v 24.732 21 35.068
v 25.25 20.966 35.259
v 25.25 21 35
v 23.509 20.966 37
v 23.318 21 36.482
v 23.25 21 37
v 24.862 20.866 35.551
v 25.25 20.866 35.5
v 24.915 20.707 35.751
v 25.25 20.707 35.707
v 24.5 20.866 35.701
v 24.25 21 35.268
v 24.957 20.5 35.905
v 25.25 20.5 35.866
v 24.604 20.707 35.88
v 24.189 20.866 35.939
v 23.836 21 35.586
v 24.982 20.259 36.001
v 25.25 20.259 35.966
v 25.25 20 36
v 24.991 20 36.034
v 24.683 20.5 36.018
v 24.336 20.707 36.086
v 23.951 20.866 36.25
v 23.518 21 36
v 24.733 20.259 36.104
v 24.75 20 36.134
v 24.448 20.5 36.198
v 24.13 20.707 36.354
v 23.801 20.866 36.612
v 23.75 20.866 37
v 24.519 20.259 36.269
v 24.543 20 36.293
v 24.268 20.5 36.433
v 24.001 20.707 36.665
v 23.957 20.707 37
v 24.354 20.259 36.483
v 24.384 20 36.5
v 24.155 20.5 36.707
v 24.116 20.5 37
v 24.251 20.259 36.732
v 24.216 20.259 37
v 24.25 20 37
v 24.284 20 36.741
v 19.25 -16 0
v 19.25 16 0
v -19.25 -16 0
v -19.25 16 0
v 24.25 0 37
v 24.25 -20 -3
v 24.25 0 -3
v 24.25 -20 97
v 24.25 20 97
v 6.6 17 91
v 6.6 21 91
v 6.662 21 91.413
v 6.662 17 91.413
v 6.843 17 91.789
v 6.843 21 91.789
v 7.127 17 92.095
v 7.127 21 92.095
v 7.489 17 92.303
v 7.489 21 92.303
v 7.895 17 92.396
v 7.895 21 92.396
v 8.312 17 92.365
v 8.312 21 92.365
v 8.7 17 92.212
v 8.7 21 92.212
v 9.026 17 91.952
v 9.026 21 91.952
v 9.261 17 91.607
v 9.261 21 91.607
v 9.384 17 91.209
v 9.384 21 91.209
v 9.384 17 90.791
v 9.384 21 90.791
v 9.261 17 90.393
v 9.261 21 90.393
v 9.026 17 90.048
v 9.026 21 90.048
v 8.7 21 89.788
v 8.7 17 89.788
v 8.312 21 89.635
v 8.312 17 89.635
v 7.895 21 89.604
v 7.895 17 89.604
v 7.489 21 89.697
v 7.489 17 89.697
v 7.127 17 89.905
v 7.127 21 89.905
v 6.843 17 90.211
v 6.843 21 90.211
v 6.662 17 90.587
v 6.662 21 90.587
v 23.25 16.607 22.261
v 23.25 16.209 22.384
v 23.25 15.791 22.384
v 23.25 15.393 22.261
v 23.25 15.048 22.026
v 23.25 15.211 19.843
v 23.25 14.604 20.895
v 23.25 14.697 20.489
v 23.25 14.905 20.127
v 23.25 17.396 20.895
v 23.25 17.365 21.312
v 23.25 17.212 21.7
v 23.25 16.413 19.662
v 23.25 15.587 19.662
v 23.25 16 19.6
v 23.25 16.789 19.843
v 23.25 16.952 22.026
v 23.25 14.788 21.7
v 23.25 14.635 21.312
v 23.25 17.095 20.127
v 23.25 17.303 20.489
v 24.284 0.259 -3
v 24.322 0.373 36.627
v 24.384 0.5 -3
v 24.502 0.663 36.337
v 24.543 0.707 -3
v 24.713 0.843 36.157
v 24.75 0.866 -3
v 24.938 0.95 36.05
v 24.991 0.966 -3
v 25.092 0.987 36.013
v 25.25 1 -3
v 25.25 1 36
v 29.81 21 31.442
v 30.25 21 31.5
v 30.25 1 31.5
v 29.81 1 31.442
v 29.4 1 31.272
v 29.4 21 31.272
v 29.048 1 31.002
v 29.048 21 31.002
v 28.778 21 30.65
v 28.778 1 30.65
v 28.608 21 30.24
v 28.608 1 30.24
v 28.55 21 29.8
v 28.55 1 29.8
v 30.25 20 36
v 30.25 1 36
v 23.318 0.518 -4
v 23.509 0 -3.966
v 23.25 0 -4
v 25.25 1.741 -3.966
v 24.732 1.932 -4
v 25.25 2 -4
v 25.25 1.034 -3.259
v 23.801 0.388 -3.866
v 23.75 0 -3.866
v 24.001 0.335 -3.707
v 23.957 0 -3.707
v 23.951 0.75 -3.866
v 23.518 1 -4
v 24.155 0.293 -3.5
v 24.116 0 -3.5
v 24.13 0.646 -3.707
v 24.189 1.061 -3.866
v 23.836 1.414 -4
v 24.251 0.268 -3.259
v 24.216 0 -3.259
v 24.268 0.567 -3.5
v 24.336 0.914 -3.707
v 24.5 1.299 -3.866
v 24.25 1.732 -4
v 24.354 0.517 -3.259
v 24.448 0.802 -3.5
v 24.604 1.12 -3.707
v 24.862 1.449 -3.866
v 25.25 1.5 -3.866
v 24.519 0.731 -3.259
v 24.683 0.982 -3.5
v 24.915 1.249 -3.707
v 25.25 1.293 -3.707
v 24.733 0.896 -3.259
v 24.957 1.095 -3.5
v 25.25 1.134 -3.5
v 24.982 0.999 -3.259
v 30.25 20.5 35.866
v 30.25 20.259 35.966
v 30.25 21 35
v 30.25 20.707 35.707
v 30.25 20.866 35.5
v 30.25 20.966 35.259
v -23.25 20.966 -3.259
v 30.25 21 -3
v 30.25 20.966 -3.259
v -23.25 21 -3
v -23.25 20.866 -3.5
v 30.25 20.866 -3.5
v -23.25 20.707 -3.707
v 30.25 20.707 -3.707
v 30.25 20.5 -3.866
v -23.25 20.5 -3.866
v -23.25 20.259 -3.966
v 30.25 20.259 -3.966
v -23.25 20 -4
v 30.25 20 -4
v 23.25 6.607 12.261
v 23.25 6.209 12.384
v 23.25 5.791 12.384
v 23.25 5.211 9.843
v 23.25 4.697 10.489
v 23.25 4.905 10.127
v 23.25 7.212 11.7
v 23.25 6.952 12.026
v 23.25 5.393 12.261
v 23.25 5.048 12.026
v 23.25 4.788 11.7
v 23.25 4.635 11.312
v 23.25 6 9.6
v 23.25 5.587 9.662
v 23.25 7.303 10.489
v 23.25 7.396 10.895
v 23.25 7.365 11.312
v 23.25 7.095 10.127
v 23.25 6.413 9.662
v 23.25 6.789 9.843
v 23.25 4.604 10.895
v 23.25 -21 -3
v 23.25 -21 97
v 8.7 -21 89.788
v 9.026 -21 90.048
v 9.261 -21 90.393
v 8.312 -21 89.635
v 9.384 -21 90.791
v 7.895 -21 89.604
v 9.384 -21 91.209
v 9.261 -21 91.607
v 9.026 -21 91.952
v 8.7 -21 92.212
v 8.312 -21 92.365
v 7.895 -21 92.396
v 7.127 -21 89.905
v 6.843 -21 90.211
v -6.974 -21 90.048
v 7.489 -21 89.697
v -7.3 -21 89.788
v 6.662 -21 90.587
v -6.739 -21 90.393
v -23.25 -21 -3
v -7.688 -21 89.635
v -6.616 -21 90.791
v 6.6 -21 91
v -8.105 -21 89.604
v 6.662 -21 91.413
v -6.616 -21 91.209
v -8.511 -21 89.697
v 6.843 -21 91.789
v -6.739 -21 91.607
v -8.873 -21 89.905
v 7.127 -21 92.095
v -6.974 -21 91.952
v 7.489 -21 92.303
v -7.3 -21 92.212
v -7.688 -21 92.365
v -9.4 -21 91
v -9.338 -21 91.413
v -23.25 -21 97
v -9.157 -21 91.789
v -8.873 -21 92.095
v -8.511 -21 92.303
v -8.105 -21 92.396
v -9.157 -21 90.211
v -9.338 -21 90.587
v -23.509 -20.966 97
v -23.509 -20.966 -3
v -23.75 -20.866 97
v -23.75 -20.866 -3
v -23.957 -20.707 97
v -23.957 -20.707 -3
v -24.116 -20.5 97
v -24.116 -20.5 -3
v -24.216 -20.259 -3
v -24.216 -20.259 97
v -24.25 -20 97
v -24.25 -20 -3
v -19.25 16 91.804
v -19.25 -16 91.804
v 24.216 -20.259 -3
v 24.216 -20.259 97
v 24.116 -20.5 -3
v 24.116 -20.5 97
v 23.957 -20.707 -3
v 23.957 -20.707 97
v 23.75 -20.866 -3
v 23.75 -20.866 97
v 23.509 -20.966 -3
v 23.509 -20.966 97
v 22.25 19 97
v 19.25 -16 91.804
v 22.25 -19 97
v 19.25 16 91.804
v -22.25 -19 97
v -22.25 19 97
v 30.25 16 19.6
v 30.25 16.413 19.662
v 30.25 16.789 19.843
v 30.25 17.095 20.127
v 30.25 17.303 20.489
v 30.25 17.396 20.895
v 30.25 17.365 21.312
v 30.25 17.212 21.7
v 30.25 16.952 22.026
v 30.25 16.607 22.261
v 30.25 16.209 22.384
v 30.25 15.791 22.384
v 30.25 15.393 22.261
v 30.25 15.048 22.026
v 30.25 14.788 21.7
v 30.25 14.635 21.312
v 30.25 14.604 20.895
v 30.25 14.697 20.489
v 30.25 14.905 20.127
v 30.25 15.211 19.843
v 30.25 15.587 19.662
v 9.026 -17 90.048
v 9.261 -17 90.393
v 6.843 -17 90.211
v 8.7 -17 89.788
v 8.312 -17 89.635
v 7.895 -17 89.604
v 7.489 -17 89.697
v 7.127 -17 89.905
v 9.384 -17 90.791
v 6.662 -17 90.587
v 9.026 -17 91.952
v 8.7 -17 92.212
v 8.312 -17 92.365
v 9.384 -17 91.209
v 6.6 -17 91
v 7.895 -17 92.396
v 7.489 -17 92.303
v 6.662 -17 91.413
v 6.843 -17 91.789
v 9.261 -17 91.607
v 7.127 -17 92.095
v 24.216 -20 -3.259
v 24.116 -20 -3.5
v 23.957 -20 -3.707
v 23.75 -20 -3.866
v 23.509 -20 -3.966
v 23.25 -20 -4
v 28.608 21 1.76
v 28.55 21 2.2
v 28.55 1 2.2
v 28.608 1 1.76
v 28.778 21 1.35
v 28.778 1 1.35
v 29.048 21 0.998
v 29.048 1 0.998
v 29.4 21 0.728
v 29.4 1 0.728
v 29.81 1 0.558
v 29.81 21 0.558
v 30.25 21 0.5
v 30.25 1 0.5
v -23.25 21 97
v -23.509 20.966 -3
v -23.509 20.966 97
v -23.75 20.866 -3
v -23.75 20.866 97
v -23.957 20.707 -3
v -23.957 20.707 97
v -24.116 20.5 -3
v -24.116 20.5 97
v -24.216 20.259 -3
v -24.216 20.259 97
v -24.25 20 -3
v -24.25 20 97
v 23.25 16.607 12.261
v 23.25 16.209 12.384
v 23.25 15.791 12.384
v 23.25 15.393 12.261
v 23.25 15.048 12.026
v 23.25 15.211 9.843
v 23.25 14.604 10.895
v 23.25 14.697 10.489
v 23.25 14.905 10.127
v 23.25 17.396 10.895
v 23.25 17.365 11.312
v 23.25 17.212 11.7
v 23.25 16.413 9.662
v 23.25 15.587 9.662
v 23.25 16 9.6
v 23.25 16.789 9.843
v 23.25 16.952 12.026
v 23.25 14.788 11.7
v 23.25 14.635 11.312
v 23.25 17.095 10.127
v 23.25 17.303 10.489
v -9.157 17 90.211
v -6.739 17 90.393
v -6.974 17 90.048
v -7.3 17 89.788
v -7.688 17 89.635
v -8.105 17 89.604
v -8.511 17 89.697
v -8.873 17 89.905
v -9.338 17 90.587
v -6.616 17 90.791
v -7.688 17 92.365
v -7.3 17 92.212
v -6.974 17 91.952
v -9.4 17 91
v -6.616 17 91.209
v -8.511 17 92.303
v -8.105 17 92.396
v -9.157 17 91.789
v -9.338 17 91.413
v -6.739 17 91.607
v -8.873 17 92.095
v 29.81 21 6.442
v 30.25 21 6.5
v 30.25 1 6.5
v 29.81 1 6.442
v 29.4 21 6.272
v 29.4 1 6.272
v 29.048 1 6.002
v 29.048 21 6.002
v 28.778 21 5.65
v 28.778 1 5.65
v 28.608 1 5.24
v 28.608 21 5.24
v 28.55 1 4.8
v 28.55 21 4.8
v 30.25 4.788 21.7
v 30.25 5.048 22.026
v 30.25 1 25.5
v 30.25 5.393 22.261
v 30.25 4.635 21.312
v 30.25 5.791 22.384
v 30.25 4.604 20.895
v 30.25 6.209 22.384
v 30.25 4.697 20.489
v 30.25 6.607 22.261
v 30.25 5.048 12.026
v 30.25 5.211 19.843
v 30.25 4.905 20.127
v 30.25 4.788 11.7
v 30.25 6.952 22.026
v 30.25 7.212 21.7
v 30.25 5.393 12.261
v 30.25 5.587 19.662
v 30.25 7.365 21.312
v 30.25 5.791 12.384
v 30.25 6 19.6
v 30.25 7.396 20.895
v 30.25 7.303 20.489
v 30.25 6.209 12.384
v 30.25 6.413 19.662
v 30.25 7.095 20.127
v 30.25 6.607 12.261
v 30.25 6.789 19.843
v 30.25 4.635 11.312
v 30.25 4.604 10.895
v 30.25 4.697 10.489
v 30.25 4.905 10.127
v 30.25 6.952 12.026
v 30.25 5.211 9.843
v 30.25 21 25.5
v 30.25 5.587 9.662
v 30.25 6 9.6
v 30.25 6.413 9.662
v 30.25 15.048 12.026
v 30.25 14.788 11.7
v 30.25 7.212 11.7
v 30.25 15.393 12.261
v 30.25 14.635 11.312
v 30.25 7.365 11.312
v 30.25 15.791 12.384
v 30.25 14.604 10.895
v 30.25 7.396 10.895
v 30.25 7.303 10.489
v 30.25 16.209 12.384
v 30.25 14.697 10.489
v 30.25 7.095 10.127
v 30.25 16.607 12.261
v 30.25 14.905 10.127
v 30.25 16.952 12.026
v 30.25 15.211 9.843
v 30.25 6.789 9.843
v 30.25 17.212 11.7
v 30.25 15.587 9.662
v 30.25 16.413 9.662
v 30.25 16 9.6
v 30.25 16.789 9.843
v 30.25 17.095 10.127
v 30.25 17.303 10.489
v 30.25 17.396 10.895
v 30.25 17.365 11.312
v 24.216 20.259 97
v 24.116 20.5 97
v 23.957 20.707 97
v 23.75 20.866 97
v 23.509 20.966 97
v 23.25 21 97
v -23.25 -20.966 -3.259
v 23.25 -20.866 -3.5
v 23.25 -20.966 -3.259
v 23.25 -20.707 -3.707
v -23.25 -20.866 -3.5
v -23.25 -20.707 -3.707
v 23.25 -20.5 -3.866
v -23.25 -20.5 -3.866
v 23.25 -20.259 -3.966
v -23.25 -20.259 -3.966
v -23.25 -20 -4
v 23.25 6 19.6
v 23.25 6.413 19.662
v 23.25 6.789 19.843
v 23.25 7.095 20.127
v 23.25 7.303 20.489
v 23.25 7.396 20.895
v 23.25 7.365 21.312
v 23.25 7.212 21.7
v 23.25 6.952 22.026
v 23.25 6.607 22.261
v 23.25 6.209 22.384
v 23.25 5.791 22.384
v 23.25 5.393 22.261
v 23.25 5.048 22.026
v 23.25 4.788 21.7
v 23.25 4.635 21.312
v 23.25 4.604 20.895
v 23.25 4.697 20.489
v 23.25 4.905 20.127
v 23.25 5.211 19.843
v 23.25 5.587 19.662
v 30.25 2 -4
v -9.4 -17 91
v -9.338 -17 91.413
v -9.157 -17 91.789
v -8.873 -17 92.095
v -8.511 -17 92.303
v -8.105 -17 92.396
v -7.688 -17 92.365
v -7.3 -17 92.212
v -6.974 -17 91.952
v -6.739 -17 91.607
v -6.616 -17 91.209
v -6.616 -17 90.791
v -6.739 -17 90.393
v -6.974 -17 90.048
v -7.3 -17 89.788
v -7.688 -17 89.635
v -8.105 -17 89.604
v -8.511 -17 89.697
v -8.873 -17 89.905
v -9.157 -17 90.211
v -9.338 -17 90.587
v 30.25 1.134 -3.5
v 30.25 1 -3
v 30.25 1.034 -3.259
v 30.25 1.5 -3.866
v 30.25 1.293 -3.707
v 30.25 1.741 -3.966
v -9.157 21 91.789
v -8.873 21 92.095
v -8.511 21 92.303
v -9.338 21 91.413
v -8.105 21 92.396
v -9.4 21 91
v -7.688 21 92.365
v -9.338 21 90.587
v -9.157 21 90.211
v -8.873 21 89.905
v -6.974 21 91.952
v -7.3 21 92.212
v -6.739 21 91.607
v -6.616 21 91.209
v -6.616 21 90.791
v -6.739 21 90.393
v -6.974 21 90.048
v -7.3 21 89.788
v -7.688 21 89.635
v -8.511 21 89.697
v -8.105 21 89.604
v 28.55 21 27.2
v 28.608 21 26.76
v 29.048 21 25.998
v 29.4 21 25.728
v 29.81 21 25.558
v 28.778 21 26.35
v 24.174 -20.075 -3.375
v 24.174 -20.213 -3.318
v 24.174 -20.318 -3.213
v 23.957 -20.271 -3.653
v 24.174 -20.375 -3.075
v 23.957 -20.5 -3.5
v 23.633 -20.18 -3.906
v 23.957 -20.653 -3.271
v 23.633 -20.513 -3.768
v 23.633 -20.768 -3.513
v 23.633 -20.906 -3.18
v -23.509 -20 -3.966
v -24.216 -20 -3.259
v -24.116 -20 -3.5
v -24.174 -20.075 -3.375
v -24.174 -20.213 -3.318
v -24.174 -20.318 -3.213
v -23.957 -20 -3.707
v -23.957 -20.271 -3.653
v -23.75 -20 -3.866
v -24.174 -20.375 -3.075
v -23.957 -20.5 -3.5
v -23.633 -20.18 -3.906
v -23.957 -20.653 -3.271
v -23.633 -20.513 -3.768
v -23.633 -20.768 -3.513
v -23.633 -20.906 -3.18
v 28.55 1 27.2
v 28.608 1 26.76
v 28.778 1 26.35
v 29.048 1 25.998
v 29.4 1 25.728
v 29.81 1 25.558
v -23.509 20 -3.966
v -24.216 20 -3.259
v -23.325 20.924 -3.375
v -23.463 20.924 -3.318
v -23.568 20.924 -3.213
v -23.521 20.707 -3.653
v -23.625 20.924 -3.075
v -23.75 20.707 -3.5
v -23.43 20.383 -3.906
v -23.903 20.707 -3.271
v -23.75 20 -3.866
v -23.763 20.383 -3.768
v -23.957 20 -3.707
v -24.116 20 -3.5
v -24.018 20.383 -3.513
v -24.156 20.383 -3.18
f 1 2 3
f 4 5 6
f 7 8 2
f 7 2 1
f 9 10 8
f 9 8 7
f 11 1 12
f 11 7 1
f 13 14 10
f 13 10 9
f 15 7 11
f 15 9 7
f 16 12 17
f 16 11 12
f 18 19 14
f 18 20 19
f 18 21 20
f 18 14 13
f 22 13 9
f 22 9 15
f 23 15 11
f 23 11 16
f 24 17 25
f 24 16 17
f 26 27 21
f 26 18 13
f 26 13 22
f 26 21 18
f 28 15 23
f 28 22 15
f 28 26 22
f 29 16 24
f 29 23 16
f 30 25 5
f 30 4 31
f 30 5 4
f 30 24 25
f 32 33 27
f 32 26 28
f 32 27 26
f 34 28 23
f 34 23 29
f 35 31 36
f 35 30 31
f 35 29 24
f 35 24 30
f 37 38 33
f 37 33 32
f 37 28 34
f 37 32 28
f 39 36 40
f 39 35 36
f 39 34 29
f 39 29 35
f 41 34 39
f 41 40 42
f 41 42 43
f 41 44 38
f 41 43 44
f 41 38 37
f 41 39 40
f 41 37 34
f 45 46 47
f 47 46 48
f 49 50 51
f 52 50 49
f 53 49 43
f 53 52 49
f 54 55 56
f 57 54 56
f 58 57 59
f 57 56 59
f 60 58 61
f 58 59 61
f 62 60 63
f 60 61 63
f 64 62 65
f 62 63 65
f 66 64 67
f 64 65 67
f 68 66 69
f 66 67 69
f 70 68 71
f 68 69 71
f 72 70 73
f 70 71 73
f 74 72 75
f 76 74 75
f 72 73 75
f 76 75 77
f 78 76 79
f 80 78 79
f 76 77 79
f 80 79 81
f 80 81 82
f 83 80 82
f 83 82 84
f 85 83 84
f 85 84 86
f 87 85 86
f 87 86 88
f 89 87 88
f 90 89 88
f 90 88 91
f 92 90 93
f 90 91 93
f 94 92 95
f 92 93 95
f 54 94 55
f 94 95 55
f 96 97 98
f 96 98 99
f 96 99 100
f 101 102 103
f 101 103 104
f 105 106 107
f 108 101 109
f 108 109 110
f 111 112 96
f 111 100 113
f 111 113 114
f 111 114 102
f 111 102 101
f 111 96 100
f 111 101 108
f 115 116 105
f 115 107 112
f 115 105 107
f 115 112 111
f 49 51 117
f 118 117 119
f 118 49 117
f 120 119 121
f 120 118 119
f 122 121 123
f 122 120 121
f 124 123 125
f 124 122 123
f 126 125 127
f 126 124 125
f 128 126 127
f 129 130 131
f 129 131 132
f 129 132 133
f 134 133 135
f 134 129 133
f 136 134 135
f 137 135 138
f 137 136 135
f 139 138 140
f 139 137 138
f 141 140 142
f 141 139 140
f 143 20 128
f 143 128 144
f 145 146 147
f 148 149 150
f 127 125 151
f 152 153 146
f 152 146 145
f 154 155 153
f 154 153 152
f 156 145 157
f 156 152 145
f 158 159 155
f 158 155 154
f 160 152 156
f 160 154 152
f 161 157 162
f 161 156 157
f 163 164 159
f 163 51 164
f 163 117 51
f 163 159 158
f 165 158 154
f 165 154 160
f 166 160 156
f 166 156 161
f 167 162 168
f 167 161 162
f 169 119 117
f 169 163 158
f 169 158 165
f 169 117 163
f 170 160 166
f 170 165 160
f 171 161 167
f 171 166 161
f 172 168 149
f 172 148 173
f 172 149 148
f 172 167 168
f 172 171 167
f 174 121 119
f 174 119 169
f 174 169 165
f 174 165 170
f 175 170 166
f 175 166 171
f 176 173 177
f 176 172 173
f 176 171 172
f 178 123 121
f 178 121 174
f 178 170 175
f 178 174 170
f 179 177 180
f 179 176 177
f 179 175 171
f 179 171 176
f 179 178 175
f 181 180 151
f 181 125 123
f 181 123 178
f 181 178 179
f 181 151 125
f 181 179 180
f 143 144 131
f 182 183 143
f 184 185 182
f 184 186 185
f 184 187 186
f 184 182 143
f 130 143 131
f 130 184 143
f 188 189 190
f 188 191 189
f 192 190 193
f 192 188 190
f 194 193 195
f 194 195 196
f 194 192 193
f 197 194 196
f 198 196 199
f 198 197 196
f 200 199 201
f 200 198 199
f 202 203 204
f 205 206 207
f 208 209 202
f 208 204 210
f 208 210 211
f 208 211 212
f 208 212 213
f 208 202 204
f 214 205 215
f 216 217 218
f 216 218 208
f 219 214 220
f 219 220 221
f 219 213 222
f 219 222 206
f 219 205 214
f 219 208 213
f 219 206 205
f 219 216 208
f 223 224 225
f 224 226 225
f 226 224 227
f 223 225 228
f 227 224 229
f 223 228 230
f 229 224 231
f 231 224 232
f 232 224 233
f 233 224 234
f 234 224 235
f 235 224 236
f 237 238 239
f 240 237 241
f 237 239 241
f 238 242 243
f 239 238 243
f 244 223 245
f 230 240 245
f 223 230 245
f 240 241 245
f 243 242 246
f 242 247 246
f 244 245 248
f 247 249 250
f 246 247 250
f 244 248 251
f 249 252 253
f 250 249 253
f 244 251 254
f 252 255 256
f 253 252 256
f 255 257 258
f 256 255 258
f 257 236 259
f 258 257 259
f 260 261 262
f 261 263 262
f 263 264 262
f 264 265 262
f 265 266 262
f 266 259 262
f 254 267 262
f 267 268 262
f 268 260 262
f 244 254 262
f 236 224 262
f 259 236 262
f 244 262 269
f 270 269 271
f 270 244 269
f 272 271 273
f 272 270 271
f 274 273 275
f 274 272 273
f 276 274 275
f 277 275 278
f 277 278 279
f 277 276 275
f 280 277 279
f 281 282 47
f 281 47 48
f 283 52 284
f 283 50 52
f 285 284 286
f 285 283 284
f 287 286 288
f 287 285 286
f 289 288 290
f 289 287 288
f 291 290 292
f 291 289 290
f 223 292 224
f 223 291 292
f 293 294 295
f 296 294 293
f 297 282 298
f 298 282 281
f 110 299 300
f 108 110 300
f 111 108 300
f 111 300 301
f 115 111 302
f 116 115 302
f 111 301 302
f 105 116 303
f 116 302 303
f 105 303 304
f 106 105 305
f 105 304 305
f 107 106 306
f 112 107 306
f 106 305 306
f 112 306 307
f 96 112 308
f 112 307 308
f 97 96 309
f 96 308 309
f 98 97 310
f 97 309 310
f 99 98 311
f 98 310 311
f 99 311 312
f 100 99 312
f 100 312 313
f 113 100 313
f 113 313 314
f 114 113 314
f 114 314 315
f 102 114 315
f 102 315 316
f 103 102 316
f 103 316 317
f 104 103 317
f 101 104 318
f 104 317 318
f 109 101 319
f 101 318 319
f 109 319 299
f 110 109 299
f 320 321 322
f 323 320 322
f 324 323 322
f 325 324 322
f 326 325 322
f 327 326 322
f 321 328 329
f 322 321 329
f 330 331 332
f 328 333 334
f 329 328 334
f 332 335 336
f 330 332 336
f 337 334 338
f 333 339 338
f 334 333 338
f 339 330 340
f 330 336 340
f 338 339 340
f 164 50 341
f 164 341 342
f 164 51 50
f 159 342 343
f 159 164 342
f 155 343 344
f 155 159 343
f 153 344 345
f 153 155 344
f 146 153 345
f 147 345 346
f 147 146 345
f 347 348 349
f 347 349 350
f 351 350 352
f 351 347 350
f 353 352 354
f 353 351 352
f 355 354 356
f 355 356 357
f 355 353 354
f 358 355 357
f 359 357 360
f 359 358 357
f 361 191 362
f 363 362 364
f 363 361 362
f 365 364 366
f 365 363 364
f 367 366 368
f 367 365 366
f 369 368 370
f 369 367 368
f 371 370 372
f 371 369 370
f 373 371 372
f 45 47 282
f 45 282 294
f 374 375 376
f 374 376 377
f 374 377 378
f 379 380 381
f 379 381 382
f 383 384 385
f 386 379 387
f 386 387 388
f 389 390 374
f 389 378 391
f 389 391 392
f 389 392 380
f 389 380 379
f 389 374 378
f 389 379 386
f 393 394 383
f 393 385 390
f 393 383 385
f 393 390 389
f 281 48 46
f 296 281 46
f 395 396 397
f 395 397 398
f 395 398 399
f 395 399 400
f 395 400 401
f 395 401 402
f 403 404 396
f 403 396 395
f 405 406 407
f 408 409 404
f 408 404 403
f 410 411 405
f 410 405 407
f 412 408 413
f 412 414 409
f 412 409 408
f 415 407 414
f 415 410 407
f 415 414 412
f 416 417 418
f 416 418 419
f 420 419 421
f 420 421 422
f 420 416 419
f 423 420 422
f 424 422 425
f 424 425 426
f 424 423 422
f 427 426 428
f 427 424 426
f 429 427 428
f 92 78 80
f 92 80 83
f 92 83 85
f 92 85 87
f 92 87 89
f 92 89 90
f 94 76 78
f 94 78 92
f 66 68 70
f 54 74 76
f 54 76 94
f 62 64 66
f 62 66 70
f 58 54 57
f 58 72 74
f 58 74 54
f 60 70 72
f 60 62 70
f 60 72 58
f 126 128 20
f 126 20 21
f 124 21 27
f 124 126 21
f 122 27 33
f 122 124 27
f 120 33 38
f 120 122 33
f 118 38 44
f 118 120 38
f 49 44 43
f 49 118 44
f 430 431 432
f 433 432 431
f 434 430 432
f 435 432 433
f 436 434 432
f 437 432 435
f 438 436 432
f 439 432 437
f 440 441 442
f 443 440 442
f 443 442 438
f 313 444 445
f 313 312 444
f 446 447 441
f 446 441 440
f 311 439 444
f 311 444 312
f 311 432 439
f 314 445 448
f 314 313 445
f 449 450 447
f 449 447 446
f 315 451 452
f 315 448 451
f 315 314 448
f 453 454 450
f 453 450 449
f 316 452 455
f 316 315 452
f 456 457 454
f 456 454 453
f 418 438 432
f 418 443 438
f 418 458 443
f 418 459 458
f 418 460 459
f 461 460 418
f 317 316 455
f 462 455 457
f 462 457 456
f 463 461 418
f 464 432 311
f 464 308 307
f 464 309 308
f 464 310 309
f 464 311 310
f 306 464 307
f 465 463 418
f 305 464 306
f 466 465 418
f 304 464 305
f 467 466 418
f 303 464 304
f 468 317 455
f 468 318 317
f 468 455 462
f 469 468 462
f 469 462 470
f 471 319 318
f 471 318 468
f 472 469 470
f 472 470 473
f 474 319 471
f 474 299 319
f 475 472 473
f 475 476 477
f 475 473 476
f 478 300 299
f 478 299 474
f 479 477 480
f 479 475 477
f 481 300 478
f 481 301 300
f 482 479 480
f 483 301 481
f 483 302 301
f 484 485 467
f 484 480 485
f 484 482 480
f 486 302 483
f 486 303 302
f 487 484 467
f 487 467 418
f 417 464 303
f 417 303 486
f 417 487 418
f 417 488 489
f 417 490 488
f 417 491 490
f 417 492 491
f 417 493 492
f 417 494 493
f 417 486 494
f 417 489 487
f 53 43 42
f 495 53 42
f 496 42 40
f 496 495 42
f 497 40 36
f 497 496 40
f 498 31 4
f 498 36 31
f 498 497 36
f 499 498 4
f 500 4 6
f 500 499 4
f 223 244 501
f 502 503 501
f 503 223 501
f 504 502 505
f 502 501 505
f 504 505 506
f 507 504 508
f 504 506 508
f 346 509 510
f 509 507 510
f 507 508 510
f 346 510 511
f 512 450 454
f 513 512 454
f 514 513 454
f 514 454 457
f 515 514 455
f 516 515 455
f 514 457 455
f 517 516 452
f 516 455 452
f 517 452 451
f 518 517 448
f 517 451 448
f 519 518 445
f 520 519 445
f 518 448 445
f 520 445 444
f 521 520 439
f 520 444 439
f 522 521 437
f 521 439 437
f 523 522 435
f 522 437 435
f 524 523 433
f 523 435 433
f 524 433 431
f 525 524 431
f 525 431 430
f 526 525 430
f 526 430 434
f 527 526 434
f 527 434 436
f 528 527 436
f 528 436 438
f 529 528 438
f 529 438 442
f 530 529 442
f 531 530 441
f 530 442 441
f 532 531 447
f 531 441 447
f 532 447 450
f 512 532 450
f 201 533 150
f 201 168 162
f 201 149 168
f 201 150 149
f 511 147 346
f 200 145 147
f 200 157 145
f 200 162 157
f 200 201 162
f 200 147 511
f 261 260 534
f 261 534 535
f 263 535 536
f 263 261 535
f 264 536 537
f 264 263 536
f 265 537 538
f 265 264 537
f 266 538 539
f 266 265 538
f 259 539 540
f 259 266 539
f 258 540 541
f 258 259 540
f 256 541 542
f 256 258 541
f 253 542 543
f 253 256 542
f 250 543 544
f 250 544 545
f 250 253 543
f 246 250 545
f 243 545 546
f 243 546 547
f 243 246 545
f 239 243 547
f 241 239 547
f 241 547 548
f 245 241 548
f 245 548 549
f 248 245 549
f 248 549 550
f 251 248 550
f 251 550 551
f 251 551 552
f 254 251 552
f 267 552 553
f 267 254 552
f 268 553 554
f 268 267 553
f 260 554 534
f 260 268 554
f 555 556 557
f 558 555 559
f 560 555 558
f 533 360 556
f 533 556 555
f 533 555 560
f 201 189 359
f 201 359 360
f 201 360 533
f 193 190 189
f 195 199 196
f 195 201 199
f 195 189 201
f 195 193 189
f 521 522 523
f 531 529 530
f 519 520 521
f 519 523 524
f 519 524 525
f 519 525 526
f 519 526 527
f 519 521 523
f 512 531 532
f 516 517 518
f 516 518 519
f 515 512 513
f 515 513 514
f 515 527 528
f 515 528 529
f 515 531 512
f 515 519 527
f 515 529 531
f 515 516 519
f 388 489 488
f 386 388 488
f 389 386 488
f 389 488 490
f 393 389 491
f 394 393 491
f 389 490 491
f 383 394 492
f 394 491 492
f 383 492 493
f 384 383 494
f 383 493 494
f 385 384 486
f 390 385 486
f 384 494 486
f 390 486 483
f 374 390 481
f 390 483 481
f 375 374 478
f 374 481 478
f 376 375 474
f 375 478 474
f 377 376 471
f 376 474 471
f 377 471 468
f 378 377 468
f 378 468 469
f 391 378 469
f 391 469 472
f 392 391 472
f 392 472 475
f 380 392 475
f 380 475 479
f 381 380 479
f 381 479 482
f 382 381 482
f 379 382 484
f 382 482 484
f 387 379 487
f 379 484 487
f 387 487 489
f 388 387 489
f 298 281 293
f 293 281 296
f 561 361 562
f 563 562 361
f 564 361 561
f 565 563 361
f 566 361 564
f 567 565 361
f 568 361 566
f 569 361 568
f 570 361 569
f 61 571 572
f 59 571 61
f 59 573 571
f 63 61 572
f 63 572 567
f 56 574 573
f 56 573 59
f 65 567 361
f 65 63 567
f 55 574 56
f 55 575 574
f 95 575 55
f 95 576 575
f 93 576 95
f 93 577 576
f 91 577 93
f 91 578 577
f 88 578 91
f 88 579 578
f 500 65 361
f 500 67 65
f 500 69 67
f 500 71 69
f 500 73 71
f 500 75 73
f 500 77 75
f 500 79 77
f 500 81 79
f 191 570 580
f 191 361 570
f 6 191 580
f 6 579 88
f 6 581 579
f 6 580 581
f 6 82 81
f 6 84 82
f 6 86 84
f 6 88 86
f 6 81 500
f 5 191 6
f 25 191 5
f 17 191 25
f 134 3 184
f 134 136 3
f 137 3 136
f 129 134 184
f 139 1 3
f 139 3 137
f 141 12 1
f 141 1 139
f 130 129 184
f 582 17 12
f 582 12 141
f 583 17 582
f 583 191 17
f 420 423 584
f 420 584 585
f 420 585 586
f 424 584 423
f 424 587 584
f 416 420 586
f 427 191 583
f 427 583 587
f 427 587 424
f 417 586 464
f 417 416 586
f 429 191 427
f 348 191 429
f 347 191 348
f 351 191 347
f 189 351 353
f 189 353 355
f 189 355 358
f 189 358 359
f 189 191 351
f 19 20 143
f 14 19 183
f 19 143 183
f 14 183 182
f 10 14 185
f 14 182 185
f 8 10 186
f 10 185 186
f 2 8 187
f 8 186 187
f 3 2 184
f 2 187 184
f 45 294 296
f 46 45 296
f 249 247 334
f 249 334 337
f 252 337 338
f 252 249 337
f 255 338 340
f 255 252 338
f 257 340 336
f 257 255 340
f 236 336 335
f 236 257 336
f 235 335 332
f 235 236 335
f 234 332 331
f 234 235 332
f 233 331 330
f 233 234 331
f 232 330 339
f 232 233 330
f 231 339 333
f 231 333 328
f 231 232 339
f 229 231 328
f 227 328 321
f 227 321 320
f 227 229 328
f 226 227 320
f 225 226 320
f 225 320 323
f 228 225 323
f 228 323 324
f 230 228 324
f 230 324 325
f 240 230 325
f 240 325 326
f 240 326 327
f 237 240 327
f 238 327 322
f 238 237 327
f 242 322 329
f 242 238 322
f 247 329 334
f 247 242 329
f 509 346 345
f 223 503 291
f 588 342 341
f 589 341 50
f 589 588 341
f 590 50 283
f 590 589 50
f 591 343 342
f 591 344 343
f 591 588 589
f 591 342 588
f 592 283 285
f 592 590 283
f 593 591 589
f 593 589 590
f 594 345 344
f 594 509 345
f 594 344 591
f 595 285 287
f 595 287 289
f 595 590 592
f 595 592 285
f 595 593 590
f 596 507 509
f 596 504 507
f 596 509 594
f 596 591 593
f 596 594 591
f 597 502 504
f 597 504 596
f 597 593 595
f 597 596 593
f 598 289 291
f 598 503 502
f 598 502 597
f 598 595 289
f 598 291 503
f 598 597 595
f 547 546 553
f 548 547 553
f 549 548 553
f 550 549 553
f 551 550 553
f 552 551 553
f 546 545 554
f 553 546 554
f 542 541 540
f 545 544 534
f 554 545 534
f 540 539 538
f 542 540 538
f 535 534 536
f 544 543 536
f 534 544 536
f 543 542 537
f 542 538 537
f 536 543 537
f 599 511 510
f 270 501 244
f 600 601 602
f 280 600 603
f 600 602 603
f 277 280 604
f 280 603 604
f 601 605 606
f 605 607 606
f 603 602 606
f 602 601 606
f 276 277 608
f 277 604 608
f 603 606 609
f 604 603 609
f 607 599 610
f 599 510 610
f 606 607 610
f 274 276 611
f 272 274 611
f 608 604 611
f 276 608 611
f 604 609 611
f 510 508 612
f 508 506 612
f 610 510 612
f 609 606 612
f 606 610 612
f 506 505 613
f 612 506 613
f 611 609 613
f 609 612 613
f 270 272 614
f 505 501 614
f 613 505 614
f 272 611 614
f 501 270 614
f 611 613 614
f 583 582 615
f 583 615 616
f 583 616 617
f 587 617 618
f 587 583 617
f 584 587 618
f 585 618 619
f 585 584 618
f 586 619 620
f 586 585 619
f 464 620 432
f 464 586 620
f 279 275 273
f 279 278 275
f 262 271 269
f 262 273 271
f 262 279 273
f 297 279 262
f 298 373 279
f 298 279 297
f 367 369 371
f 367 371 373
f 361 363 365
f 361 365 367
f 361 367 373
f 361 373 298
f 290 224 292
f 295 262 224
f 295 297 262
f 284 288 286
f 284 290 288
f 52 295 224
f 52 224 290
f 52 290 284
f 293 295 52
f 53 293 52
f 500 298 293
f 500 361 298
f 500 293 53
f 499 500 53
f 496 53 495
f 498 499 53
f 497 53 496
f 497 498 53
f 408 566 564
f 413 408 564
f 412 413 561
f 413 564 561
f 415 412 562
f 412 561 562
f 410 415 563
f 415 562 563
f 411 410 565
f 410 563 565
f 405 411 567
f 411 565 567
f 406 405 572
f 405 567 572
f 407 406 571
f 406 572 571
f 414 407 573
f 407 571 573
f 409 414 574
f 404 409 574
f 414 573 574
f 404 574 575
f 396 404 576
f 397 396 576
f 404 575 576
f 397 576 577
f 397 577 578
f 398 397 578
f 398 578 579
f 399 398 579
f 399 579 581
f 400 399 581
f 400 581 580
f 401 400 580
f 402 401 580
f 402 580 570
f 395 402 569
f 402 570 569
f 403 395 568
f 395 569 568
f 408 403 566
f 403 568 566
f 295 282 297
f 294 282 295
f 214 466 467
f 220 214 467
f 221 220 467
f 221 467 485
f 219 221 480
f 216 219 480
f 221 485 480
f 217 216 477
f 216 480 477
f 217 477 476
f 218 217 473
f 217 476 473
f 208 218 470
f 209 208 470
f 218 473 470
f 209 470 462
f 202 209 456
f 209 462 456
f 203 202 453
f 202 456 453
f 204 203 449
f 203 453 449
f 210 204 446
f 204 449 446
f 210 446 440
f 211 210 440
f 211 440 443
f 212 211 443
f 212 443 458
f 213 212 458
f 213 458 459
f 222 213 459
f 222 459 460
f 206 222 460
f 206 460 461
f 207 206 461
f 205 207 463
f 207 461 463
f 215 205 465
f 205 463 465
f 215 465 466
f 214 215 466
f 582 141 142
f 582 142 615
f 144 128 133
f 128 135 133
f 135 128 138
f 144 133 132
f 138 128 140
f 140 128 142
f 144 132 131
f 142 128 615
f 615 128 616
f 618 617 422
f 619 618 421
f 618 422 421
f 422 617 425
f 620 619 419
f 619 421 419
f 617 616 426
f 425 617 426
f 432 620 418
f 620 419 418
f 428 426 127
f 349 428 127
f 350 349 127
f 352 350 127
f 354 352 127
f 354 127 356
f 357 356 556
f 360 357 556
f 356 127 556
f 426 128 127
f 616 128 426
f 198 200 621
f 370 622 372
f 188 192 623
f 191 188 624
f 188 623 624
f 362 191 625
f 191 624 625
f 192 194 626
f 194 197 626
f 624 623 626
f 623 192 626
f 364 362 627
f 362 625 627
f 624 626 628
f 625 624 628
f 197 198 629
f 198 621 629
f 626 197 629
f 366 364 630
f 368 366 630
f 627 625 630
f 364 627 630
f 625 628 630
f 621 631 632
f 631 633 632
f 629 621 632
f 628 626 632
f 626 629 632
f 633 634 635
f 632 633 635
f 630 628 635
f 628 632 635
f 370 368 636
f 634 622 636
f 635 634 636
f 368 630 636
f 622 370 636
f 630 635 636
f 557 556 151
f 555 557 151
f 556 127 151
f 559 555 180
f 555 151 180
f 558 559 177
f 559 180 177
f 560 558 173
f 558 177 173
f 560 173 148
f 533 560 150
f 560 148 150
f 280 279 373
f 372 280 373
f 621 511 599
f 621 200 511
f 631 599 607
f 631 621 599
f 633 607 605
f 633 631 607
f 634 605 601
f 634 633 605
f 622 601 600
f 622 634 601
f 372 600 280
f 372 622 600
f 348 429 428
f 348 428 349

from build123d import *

# Parameters (mm, degrees)
SKETCH2_W                         = 48.5
SKETCH2_H                         = 42
SKETCH2_W_2                       = 38.5
SKETCH2_H_2                       = 32
SLEEVE_DEPTH                      = 97
SKETCH3_W                         = 48.5
SKETCH3_H                         = 42
REAR_COVER_DEPTH                  = 4
BASKET_CLAMP_DEPTH                = 20
SKETCH5_R                         = 1.4
BASKET_CLAMP_MOUNTING_HOLES_DEPTH = 7
SKETCH7_R                         = 1.4
FRONT_COVER_SCREW_HOLES_TOP_DEPTH = 4
F_1MM_EDGE_FILLETS_R              = 1
BATTERY_INSERTION_CHAMFER_SIZE    = 3
BATTERY_INSERTION_CHAMFER_SIZE2   = 5.196152423


with BuildPart() as part:
    # Sketch2 → Sleeve (new body)
    with BuildSketch(Plane.XY):
        Rectangle(SKETCH2_W, SKETCH2_H)
        Rectangle(SKETCH2_W_2, SKETCH2_H_2, mode=Mode.SUBTRACT)
    extrude(amount=SLEEVE_DEPTH)

    # Sketch3 → Rear Cover (add)
    with BuildSketch(Plane(origin=(0, 0, 0), x_dir=(-1, 0, 0), z_dir=(0, 0, -1))):
        Rectangle(SKETCH3_W, SKETCH3_H)
    extrude(amount=REAR_COVER_DEPTH)

    # Sketch4 → Basket Clamp (add)
    with BuildSketch(Plane(origin=(0, 21, 0), x_dir=(1, 0, 0), z_dir=(0, 1, 0))):
        with BuildLine():
            Line((24.25, 4), (24.25, -36))
            Line((24.25, -36), (30.25, -36))
            Line((30.25, -36), (30.25, -31.5))
            ThreePointArc((30.25, -31.5), (29.047918472, -31.002081528), (28.55, -29.8))
            Line((28.55, -29.8), (28.55, -27.2))
            ThreePointArc((28.55, -27.2), (29.047918472, -25.997918472), (30.25, -25.5))
            Line((30.25, -25.5), (30.25, -6.5))
            ThreePointArc((30.25, -6.5), (29.047918472, -6.002081528), (28.55, -4.8))
            Line((28.55, -4.8), (28.55, -2.2))
            ThreePointArc((28.55, -2.2), (29.047918472, -0.997918472), (30.25, -0.5))
            Line((30.25, -0.5), (30.25, 4))
            Line((30.25, 4), (24.25, 4))
        make_face()
    extrude(amount=-BASKET_CLAMP_DEPTH)

    # Sketch5 → Basket Clamp Mounting Holes (cut)
    with BuildSketch(Plane(origin=(30.25, 0, 0), x_dir=(0, 0, -1), z_dir=(1, 0, 0))):
        with Locations((-21, 16)):
            Circle(SKETCH5_R)
        with Locations((-11, 16)):
            Circle(SKETCH5_R)
        with Locations((-11, 6)):
            Circle(SKETCH5_R)
        with Locations((-21, 6)):
            Circle(SKETCH5_R)
    extrude(amount=-BASKET_CLAMP_MOUNTING_HOLES_DEPTH, mode=Mode.SUBTRACT)

    # Sketch7 → Front Cover Screw Holes Top (cut)
    with BuildSketch(Plane(origin=(0, 21, 0), x_dir=(1, 0, 0), z_dir=(0, 1, 0))):
        with Locations((-8, -91)):
            Circle(SKETCH7_R)
        with Locations((8, -91)):
            Circle(SKETCH7_R)
    front_cover_screw_holes_top = extrude(amount=-FRONT_COVER_SCREW_HOLES_TOP_DEPTH, mode=Mode.SUBTRACT)

    # Front Cover Screw Holes Bottom: Front Cover Screw Holes Top across plane
    add(front_cover_screw_holes_top.mirror(Plane.ZX), mode=Mode.SUBTRACT)

    # 1mm Edge Fillets
    f_1mm_edge_fillets_edges = [part.edges().sort_by_distance(p)[0] for p in [
        (27.25, 1, -4),
        (-24.25, -21, 46.5),
        (24.25, 11, 36),
        (24.25, 1, 16),
        (24.25, -21, 46.5),
        (0, -21, -4),
        (24.25, -10, -4),
        (-24.25, 0, -4),
        (3, 21, -4),
        (-24.25, 21, 46.5),
        (24.25, 21, 66.5),
        (27.25, 21, 36),
    ]]
    fillet(f_1mm_edge_fillets_edges, radius=F_1MM_EDGE_FILLETS_R)

    # Battery Insertion Chamfer
    battery_insertion_chamfer_edges = [part.edges().sort_by_distance(p)[0] for p in [
        (19.25, 0, 97),
        (0, 16, 97),
        (-19.25, 0, 97),
        (0, -16, 97),
    ]]
    battery_insertion_chamfer_side = [part.faces().sort_by_distance(p)[0] for p in [
        (0, 20.358419919, 97),
    ]]
    chamfer(battery_insertion_chamfer_edges, length=BATTERY_INSERTION_CHAMFER_SIZE, length2=BATTERY_INSERTION_CHAMFER_SIZE2, reference=battery_insertion_chamfer_side[0])


solid = part.part
